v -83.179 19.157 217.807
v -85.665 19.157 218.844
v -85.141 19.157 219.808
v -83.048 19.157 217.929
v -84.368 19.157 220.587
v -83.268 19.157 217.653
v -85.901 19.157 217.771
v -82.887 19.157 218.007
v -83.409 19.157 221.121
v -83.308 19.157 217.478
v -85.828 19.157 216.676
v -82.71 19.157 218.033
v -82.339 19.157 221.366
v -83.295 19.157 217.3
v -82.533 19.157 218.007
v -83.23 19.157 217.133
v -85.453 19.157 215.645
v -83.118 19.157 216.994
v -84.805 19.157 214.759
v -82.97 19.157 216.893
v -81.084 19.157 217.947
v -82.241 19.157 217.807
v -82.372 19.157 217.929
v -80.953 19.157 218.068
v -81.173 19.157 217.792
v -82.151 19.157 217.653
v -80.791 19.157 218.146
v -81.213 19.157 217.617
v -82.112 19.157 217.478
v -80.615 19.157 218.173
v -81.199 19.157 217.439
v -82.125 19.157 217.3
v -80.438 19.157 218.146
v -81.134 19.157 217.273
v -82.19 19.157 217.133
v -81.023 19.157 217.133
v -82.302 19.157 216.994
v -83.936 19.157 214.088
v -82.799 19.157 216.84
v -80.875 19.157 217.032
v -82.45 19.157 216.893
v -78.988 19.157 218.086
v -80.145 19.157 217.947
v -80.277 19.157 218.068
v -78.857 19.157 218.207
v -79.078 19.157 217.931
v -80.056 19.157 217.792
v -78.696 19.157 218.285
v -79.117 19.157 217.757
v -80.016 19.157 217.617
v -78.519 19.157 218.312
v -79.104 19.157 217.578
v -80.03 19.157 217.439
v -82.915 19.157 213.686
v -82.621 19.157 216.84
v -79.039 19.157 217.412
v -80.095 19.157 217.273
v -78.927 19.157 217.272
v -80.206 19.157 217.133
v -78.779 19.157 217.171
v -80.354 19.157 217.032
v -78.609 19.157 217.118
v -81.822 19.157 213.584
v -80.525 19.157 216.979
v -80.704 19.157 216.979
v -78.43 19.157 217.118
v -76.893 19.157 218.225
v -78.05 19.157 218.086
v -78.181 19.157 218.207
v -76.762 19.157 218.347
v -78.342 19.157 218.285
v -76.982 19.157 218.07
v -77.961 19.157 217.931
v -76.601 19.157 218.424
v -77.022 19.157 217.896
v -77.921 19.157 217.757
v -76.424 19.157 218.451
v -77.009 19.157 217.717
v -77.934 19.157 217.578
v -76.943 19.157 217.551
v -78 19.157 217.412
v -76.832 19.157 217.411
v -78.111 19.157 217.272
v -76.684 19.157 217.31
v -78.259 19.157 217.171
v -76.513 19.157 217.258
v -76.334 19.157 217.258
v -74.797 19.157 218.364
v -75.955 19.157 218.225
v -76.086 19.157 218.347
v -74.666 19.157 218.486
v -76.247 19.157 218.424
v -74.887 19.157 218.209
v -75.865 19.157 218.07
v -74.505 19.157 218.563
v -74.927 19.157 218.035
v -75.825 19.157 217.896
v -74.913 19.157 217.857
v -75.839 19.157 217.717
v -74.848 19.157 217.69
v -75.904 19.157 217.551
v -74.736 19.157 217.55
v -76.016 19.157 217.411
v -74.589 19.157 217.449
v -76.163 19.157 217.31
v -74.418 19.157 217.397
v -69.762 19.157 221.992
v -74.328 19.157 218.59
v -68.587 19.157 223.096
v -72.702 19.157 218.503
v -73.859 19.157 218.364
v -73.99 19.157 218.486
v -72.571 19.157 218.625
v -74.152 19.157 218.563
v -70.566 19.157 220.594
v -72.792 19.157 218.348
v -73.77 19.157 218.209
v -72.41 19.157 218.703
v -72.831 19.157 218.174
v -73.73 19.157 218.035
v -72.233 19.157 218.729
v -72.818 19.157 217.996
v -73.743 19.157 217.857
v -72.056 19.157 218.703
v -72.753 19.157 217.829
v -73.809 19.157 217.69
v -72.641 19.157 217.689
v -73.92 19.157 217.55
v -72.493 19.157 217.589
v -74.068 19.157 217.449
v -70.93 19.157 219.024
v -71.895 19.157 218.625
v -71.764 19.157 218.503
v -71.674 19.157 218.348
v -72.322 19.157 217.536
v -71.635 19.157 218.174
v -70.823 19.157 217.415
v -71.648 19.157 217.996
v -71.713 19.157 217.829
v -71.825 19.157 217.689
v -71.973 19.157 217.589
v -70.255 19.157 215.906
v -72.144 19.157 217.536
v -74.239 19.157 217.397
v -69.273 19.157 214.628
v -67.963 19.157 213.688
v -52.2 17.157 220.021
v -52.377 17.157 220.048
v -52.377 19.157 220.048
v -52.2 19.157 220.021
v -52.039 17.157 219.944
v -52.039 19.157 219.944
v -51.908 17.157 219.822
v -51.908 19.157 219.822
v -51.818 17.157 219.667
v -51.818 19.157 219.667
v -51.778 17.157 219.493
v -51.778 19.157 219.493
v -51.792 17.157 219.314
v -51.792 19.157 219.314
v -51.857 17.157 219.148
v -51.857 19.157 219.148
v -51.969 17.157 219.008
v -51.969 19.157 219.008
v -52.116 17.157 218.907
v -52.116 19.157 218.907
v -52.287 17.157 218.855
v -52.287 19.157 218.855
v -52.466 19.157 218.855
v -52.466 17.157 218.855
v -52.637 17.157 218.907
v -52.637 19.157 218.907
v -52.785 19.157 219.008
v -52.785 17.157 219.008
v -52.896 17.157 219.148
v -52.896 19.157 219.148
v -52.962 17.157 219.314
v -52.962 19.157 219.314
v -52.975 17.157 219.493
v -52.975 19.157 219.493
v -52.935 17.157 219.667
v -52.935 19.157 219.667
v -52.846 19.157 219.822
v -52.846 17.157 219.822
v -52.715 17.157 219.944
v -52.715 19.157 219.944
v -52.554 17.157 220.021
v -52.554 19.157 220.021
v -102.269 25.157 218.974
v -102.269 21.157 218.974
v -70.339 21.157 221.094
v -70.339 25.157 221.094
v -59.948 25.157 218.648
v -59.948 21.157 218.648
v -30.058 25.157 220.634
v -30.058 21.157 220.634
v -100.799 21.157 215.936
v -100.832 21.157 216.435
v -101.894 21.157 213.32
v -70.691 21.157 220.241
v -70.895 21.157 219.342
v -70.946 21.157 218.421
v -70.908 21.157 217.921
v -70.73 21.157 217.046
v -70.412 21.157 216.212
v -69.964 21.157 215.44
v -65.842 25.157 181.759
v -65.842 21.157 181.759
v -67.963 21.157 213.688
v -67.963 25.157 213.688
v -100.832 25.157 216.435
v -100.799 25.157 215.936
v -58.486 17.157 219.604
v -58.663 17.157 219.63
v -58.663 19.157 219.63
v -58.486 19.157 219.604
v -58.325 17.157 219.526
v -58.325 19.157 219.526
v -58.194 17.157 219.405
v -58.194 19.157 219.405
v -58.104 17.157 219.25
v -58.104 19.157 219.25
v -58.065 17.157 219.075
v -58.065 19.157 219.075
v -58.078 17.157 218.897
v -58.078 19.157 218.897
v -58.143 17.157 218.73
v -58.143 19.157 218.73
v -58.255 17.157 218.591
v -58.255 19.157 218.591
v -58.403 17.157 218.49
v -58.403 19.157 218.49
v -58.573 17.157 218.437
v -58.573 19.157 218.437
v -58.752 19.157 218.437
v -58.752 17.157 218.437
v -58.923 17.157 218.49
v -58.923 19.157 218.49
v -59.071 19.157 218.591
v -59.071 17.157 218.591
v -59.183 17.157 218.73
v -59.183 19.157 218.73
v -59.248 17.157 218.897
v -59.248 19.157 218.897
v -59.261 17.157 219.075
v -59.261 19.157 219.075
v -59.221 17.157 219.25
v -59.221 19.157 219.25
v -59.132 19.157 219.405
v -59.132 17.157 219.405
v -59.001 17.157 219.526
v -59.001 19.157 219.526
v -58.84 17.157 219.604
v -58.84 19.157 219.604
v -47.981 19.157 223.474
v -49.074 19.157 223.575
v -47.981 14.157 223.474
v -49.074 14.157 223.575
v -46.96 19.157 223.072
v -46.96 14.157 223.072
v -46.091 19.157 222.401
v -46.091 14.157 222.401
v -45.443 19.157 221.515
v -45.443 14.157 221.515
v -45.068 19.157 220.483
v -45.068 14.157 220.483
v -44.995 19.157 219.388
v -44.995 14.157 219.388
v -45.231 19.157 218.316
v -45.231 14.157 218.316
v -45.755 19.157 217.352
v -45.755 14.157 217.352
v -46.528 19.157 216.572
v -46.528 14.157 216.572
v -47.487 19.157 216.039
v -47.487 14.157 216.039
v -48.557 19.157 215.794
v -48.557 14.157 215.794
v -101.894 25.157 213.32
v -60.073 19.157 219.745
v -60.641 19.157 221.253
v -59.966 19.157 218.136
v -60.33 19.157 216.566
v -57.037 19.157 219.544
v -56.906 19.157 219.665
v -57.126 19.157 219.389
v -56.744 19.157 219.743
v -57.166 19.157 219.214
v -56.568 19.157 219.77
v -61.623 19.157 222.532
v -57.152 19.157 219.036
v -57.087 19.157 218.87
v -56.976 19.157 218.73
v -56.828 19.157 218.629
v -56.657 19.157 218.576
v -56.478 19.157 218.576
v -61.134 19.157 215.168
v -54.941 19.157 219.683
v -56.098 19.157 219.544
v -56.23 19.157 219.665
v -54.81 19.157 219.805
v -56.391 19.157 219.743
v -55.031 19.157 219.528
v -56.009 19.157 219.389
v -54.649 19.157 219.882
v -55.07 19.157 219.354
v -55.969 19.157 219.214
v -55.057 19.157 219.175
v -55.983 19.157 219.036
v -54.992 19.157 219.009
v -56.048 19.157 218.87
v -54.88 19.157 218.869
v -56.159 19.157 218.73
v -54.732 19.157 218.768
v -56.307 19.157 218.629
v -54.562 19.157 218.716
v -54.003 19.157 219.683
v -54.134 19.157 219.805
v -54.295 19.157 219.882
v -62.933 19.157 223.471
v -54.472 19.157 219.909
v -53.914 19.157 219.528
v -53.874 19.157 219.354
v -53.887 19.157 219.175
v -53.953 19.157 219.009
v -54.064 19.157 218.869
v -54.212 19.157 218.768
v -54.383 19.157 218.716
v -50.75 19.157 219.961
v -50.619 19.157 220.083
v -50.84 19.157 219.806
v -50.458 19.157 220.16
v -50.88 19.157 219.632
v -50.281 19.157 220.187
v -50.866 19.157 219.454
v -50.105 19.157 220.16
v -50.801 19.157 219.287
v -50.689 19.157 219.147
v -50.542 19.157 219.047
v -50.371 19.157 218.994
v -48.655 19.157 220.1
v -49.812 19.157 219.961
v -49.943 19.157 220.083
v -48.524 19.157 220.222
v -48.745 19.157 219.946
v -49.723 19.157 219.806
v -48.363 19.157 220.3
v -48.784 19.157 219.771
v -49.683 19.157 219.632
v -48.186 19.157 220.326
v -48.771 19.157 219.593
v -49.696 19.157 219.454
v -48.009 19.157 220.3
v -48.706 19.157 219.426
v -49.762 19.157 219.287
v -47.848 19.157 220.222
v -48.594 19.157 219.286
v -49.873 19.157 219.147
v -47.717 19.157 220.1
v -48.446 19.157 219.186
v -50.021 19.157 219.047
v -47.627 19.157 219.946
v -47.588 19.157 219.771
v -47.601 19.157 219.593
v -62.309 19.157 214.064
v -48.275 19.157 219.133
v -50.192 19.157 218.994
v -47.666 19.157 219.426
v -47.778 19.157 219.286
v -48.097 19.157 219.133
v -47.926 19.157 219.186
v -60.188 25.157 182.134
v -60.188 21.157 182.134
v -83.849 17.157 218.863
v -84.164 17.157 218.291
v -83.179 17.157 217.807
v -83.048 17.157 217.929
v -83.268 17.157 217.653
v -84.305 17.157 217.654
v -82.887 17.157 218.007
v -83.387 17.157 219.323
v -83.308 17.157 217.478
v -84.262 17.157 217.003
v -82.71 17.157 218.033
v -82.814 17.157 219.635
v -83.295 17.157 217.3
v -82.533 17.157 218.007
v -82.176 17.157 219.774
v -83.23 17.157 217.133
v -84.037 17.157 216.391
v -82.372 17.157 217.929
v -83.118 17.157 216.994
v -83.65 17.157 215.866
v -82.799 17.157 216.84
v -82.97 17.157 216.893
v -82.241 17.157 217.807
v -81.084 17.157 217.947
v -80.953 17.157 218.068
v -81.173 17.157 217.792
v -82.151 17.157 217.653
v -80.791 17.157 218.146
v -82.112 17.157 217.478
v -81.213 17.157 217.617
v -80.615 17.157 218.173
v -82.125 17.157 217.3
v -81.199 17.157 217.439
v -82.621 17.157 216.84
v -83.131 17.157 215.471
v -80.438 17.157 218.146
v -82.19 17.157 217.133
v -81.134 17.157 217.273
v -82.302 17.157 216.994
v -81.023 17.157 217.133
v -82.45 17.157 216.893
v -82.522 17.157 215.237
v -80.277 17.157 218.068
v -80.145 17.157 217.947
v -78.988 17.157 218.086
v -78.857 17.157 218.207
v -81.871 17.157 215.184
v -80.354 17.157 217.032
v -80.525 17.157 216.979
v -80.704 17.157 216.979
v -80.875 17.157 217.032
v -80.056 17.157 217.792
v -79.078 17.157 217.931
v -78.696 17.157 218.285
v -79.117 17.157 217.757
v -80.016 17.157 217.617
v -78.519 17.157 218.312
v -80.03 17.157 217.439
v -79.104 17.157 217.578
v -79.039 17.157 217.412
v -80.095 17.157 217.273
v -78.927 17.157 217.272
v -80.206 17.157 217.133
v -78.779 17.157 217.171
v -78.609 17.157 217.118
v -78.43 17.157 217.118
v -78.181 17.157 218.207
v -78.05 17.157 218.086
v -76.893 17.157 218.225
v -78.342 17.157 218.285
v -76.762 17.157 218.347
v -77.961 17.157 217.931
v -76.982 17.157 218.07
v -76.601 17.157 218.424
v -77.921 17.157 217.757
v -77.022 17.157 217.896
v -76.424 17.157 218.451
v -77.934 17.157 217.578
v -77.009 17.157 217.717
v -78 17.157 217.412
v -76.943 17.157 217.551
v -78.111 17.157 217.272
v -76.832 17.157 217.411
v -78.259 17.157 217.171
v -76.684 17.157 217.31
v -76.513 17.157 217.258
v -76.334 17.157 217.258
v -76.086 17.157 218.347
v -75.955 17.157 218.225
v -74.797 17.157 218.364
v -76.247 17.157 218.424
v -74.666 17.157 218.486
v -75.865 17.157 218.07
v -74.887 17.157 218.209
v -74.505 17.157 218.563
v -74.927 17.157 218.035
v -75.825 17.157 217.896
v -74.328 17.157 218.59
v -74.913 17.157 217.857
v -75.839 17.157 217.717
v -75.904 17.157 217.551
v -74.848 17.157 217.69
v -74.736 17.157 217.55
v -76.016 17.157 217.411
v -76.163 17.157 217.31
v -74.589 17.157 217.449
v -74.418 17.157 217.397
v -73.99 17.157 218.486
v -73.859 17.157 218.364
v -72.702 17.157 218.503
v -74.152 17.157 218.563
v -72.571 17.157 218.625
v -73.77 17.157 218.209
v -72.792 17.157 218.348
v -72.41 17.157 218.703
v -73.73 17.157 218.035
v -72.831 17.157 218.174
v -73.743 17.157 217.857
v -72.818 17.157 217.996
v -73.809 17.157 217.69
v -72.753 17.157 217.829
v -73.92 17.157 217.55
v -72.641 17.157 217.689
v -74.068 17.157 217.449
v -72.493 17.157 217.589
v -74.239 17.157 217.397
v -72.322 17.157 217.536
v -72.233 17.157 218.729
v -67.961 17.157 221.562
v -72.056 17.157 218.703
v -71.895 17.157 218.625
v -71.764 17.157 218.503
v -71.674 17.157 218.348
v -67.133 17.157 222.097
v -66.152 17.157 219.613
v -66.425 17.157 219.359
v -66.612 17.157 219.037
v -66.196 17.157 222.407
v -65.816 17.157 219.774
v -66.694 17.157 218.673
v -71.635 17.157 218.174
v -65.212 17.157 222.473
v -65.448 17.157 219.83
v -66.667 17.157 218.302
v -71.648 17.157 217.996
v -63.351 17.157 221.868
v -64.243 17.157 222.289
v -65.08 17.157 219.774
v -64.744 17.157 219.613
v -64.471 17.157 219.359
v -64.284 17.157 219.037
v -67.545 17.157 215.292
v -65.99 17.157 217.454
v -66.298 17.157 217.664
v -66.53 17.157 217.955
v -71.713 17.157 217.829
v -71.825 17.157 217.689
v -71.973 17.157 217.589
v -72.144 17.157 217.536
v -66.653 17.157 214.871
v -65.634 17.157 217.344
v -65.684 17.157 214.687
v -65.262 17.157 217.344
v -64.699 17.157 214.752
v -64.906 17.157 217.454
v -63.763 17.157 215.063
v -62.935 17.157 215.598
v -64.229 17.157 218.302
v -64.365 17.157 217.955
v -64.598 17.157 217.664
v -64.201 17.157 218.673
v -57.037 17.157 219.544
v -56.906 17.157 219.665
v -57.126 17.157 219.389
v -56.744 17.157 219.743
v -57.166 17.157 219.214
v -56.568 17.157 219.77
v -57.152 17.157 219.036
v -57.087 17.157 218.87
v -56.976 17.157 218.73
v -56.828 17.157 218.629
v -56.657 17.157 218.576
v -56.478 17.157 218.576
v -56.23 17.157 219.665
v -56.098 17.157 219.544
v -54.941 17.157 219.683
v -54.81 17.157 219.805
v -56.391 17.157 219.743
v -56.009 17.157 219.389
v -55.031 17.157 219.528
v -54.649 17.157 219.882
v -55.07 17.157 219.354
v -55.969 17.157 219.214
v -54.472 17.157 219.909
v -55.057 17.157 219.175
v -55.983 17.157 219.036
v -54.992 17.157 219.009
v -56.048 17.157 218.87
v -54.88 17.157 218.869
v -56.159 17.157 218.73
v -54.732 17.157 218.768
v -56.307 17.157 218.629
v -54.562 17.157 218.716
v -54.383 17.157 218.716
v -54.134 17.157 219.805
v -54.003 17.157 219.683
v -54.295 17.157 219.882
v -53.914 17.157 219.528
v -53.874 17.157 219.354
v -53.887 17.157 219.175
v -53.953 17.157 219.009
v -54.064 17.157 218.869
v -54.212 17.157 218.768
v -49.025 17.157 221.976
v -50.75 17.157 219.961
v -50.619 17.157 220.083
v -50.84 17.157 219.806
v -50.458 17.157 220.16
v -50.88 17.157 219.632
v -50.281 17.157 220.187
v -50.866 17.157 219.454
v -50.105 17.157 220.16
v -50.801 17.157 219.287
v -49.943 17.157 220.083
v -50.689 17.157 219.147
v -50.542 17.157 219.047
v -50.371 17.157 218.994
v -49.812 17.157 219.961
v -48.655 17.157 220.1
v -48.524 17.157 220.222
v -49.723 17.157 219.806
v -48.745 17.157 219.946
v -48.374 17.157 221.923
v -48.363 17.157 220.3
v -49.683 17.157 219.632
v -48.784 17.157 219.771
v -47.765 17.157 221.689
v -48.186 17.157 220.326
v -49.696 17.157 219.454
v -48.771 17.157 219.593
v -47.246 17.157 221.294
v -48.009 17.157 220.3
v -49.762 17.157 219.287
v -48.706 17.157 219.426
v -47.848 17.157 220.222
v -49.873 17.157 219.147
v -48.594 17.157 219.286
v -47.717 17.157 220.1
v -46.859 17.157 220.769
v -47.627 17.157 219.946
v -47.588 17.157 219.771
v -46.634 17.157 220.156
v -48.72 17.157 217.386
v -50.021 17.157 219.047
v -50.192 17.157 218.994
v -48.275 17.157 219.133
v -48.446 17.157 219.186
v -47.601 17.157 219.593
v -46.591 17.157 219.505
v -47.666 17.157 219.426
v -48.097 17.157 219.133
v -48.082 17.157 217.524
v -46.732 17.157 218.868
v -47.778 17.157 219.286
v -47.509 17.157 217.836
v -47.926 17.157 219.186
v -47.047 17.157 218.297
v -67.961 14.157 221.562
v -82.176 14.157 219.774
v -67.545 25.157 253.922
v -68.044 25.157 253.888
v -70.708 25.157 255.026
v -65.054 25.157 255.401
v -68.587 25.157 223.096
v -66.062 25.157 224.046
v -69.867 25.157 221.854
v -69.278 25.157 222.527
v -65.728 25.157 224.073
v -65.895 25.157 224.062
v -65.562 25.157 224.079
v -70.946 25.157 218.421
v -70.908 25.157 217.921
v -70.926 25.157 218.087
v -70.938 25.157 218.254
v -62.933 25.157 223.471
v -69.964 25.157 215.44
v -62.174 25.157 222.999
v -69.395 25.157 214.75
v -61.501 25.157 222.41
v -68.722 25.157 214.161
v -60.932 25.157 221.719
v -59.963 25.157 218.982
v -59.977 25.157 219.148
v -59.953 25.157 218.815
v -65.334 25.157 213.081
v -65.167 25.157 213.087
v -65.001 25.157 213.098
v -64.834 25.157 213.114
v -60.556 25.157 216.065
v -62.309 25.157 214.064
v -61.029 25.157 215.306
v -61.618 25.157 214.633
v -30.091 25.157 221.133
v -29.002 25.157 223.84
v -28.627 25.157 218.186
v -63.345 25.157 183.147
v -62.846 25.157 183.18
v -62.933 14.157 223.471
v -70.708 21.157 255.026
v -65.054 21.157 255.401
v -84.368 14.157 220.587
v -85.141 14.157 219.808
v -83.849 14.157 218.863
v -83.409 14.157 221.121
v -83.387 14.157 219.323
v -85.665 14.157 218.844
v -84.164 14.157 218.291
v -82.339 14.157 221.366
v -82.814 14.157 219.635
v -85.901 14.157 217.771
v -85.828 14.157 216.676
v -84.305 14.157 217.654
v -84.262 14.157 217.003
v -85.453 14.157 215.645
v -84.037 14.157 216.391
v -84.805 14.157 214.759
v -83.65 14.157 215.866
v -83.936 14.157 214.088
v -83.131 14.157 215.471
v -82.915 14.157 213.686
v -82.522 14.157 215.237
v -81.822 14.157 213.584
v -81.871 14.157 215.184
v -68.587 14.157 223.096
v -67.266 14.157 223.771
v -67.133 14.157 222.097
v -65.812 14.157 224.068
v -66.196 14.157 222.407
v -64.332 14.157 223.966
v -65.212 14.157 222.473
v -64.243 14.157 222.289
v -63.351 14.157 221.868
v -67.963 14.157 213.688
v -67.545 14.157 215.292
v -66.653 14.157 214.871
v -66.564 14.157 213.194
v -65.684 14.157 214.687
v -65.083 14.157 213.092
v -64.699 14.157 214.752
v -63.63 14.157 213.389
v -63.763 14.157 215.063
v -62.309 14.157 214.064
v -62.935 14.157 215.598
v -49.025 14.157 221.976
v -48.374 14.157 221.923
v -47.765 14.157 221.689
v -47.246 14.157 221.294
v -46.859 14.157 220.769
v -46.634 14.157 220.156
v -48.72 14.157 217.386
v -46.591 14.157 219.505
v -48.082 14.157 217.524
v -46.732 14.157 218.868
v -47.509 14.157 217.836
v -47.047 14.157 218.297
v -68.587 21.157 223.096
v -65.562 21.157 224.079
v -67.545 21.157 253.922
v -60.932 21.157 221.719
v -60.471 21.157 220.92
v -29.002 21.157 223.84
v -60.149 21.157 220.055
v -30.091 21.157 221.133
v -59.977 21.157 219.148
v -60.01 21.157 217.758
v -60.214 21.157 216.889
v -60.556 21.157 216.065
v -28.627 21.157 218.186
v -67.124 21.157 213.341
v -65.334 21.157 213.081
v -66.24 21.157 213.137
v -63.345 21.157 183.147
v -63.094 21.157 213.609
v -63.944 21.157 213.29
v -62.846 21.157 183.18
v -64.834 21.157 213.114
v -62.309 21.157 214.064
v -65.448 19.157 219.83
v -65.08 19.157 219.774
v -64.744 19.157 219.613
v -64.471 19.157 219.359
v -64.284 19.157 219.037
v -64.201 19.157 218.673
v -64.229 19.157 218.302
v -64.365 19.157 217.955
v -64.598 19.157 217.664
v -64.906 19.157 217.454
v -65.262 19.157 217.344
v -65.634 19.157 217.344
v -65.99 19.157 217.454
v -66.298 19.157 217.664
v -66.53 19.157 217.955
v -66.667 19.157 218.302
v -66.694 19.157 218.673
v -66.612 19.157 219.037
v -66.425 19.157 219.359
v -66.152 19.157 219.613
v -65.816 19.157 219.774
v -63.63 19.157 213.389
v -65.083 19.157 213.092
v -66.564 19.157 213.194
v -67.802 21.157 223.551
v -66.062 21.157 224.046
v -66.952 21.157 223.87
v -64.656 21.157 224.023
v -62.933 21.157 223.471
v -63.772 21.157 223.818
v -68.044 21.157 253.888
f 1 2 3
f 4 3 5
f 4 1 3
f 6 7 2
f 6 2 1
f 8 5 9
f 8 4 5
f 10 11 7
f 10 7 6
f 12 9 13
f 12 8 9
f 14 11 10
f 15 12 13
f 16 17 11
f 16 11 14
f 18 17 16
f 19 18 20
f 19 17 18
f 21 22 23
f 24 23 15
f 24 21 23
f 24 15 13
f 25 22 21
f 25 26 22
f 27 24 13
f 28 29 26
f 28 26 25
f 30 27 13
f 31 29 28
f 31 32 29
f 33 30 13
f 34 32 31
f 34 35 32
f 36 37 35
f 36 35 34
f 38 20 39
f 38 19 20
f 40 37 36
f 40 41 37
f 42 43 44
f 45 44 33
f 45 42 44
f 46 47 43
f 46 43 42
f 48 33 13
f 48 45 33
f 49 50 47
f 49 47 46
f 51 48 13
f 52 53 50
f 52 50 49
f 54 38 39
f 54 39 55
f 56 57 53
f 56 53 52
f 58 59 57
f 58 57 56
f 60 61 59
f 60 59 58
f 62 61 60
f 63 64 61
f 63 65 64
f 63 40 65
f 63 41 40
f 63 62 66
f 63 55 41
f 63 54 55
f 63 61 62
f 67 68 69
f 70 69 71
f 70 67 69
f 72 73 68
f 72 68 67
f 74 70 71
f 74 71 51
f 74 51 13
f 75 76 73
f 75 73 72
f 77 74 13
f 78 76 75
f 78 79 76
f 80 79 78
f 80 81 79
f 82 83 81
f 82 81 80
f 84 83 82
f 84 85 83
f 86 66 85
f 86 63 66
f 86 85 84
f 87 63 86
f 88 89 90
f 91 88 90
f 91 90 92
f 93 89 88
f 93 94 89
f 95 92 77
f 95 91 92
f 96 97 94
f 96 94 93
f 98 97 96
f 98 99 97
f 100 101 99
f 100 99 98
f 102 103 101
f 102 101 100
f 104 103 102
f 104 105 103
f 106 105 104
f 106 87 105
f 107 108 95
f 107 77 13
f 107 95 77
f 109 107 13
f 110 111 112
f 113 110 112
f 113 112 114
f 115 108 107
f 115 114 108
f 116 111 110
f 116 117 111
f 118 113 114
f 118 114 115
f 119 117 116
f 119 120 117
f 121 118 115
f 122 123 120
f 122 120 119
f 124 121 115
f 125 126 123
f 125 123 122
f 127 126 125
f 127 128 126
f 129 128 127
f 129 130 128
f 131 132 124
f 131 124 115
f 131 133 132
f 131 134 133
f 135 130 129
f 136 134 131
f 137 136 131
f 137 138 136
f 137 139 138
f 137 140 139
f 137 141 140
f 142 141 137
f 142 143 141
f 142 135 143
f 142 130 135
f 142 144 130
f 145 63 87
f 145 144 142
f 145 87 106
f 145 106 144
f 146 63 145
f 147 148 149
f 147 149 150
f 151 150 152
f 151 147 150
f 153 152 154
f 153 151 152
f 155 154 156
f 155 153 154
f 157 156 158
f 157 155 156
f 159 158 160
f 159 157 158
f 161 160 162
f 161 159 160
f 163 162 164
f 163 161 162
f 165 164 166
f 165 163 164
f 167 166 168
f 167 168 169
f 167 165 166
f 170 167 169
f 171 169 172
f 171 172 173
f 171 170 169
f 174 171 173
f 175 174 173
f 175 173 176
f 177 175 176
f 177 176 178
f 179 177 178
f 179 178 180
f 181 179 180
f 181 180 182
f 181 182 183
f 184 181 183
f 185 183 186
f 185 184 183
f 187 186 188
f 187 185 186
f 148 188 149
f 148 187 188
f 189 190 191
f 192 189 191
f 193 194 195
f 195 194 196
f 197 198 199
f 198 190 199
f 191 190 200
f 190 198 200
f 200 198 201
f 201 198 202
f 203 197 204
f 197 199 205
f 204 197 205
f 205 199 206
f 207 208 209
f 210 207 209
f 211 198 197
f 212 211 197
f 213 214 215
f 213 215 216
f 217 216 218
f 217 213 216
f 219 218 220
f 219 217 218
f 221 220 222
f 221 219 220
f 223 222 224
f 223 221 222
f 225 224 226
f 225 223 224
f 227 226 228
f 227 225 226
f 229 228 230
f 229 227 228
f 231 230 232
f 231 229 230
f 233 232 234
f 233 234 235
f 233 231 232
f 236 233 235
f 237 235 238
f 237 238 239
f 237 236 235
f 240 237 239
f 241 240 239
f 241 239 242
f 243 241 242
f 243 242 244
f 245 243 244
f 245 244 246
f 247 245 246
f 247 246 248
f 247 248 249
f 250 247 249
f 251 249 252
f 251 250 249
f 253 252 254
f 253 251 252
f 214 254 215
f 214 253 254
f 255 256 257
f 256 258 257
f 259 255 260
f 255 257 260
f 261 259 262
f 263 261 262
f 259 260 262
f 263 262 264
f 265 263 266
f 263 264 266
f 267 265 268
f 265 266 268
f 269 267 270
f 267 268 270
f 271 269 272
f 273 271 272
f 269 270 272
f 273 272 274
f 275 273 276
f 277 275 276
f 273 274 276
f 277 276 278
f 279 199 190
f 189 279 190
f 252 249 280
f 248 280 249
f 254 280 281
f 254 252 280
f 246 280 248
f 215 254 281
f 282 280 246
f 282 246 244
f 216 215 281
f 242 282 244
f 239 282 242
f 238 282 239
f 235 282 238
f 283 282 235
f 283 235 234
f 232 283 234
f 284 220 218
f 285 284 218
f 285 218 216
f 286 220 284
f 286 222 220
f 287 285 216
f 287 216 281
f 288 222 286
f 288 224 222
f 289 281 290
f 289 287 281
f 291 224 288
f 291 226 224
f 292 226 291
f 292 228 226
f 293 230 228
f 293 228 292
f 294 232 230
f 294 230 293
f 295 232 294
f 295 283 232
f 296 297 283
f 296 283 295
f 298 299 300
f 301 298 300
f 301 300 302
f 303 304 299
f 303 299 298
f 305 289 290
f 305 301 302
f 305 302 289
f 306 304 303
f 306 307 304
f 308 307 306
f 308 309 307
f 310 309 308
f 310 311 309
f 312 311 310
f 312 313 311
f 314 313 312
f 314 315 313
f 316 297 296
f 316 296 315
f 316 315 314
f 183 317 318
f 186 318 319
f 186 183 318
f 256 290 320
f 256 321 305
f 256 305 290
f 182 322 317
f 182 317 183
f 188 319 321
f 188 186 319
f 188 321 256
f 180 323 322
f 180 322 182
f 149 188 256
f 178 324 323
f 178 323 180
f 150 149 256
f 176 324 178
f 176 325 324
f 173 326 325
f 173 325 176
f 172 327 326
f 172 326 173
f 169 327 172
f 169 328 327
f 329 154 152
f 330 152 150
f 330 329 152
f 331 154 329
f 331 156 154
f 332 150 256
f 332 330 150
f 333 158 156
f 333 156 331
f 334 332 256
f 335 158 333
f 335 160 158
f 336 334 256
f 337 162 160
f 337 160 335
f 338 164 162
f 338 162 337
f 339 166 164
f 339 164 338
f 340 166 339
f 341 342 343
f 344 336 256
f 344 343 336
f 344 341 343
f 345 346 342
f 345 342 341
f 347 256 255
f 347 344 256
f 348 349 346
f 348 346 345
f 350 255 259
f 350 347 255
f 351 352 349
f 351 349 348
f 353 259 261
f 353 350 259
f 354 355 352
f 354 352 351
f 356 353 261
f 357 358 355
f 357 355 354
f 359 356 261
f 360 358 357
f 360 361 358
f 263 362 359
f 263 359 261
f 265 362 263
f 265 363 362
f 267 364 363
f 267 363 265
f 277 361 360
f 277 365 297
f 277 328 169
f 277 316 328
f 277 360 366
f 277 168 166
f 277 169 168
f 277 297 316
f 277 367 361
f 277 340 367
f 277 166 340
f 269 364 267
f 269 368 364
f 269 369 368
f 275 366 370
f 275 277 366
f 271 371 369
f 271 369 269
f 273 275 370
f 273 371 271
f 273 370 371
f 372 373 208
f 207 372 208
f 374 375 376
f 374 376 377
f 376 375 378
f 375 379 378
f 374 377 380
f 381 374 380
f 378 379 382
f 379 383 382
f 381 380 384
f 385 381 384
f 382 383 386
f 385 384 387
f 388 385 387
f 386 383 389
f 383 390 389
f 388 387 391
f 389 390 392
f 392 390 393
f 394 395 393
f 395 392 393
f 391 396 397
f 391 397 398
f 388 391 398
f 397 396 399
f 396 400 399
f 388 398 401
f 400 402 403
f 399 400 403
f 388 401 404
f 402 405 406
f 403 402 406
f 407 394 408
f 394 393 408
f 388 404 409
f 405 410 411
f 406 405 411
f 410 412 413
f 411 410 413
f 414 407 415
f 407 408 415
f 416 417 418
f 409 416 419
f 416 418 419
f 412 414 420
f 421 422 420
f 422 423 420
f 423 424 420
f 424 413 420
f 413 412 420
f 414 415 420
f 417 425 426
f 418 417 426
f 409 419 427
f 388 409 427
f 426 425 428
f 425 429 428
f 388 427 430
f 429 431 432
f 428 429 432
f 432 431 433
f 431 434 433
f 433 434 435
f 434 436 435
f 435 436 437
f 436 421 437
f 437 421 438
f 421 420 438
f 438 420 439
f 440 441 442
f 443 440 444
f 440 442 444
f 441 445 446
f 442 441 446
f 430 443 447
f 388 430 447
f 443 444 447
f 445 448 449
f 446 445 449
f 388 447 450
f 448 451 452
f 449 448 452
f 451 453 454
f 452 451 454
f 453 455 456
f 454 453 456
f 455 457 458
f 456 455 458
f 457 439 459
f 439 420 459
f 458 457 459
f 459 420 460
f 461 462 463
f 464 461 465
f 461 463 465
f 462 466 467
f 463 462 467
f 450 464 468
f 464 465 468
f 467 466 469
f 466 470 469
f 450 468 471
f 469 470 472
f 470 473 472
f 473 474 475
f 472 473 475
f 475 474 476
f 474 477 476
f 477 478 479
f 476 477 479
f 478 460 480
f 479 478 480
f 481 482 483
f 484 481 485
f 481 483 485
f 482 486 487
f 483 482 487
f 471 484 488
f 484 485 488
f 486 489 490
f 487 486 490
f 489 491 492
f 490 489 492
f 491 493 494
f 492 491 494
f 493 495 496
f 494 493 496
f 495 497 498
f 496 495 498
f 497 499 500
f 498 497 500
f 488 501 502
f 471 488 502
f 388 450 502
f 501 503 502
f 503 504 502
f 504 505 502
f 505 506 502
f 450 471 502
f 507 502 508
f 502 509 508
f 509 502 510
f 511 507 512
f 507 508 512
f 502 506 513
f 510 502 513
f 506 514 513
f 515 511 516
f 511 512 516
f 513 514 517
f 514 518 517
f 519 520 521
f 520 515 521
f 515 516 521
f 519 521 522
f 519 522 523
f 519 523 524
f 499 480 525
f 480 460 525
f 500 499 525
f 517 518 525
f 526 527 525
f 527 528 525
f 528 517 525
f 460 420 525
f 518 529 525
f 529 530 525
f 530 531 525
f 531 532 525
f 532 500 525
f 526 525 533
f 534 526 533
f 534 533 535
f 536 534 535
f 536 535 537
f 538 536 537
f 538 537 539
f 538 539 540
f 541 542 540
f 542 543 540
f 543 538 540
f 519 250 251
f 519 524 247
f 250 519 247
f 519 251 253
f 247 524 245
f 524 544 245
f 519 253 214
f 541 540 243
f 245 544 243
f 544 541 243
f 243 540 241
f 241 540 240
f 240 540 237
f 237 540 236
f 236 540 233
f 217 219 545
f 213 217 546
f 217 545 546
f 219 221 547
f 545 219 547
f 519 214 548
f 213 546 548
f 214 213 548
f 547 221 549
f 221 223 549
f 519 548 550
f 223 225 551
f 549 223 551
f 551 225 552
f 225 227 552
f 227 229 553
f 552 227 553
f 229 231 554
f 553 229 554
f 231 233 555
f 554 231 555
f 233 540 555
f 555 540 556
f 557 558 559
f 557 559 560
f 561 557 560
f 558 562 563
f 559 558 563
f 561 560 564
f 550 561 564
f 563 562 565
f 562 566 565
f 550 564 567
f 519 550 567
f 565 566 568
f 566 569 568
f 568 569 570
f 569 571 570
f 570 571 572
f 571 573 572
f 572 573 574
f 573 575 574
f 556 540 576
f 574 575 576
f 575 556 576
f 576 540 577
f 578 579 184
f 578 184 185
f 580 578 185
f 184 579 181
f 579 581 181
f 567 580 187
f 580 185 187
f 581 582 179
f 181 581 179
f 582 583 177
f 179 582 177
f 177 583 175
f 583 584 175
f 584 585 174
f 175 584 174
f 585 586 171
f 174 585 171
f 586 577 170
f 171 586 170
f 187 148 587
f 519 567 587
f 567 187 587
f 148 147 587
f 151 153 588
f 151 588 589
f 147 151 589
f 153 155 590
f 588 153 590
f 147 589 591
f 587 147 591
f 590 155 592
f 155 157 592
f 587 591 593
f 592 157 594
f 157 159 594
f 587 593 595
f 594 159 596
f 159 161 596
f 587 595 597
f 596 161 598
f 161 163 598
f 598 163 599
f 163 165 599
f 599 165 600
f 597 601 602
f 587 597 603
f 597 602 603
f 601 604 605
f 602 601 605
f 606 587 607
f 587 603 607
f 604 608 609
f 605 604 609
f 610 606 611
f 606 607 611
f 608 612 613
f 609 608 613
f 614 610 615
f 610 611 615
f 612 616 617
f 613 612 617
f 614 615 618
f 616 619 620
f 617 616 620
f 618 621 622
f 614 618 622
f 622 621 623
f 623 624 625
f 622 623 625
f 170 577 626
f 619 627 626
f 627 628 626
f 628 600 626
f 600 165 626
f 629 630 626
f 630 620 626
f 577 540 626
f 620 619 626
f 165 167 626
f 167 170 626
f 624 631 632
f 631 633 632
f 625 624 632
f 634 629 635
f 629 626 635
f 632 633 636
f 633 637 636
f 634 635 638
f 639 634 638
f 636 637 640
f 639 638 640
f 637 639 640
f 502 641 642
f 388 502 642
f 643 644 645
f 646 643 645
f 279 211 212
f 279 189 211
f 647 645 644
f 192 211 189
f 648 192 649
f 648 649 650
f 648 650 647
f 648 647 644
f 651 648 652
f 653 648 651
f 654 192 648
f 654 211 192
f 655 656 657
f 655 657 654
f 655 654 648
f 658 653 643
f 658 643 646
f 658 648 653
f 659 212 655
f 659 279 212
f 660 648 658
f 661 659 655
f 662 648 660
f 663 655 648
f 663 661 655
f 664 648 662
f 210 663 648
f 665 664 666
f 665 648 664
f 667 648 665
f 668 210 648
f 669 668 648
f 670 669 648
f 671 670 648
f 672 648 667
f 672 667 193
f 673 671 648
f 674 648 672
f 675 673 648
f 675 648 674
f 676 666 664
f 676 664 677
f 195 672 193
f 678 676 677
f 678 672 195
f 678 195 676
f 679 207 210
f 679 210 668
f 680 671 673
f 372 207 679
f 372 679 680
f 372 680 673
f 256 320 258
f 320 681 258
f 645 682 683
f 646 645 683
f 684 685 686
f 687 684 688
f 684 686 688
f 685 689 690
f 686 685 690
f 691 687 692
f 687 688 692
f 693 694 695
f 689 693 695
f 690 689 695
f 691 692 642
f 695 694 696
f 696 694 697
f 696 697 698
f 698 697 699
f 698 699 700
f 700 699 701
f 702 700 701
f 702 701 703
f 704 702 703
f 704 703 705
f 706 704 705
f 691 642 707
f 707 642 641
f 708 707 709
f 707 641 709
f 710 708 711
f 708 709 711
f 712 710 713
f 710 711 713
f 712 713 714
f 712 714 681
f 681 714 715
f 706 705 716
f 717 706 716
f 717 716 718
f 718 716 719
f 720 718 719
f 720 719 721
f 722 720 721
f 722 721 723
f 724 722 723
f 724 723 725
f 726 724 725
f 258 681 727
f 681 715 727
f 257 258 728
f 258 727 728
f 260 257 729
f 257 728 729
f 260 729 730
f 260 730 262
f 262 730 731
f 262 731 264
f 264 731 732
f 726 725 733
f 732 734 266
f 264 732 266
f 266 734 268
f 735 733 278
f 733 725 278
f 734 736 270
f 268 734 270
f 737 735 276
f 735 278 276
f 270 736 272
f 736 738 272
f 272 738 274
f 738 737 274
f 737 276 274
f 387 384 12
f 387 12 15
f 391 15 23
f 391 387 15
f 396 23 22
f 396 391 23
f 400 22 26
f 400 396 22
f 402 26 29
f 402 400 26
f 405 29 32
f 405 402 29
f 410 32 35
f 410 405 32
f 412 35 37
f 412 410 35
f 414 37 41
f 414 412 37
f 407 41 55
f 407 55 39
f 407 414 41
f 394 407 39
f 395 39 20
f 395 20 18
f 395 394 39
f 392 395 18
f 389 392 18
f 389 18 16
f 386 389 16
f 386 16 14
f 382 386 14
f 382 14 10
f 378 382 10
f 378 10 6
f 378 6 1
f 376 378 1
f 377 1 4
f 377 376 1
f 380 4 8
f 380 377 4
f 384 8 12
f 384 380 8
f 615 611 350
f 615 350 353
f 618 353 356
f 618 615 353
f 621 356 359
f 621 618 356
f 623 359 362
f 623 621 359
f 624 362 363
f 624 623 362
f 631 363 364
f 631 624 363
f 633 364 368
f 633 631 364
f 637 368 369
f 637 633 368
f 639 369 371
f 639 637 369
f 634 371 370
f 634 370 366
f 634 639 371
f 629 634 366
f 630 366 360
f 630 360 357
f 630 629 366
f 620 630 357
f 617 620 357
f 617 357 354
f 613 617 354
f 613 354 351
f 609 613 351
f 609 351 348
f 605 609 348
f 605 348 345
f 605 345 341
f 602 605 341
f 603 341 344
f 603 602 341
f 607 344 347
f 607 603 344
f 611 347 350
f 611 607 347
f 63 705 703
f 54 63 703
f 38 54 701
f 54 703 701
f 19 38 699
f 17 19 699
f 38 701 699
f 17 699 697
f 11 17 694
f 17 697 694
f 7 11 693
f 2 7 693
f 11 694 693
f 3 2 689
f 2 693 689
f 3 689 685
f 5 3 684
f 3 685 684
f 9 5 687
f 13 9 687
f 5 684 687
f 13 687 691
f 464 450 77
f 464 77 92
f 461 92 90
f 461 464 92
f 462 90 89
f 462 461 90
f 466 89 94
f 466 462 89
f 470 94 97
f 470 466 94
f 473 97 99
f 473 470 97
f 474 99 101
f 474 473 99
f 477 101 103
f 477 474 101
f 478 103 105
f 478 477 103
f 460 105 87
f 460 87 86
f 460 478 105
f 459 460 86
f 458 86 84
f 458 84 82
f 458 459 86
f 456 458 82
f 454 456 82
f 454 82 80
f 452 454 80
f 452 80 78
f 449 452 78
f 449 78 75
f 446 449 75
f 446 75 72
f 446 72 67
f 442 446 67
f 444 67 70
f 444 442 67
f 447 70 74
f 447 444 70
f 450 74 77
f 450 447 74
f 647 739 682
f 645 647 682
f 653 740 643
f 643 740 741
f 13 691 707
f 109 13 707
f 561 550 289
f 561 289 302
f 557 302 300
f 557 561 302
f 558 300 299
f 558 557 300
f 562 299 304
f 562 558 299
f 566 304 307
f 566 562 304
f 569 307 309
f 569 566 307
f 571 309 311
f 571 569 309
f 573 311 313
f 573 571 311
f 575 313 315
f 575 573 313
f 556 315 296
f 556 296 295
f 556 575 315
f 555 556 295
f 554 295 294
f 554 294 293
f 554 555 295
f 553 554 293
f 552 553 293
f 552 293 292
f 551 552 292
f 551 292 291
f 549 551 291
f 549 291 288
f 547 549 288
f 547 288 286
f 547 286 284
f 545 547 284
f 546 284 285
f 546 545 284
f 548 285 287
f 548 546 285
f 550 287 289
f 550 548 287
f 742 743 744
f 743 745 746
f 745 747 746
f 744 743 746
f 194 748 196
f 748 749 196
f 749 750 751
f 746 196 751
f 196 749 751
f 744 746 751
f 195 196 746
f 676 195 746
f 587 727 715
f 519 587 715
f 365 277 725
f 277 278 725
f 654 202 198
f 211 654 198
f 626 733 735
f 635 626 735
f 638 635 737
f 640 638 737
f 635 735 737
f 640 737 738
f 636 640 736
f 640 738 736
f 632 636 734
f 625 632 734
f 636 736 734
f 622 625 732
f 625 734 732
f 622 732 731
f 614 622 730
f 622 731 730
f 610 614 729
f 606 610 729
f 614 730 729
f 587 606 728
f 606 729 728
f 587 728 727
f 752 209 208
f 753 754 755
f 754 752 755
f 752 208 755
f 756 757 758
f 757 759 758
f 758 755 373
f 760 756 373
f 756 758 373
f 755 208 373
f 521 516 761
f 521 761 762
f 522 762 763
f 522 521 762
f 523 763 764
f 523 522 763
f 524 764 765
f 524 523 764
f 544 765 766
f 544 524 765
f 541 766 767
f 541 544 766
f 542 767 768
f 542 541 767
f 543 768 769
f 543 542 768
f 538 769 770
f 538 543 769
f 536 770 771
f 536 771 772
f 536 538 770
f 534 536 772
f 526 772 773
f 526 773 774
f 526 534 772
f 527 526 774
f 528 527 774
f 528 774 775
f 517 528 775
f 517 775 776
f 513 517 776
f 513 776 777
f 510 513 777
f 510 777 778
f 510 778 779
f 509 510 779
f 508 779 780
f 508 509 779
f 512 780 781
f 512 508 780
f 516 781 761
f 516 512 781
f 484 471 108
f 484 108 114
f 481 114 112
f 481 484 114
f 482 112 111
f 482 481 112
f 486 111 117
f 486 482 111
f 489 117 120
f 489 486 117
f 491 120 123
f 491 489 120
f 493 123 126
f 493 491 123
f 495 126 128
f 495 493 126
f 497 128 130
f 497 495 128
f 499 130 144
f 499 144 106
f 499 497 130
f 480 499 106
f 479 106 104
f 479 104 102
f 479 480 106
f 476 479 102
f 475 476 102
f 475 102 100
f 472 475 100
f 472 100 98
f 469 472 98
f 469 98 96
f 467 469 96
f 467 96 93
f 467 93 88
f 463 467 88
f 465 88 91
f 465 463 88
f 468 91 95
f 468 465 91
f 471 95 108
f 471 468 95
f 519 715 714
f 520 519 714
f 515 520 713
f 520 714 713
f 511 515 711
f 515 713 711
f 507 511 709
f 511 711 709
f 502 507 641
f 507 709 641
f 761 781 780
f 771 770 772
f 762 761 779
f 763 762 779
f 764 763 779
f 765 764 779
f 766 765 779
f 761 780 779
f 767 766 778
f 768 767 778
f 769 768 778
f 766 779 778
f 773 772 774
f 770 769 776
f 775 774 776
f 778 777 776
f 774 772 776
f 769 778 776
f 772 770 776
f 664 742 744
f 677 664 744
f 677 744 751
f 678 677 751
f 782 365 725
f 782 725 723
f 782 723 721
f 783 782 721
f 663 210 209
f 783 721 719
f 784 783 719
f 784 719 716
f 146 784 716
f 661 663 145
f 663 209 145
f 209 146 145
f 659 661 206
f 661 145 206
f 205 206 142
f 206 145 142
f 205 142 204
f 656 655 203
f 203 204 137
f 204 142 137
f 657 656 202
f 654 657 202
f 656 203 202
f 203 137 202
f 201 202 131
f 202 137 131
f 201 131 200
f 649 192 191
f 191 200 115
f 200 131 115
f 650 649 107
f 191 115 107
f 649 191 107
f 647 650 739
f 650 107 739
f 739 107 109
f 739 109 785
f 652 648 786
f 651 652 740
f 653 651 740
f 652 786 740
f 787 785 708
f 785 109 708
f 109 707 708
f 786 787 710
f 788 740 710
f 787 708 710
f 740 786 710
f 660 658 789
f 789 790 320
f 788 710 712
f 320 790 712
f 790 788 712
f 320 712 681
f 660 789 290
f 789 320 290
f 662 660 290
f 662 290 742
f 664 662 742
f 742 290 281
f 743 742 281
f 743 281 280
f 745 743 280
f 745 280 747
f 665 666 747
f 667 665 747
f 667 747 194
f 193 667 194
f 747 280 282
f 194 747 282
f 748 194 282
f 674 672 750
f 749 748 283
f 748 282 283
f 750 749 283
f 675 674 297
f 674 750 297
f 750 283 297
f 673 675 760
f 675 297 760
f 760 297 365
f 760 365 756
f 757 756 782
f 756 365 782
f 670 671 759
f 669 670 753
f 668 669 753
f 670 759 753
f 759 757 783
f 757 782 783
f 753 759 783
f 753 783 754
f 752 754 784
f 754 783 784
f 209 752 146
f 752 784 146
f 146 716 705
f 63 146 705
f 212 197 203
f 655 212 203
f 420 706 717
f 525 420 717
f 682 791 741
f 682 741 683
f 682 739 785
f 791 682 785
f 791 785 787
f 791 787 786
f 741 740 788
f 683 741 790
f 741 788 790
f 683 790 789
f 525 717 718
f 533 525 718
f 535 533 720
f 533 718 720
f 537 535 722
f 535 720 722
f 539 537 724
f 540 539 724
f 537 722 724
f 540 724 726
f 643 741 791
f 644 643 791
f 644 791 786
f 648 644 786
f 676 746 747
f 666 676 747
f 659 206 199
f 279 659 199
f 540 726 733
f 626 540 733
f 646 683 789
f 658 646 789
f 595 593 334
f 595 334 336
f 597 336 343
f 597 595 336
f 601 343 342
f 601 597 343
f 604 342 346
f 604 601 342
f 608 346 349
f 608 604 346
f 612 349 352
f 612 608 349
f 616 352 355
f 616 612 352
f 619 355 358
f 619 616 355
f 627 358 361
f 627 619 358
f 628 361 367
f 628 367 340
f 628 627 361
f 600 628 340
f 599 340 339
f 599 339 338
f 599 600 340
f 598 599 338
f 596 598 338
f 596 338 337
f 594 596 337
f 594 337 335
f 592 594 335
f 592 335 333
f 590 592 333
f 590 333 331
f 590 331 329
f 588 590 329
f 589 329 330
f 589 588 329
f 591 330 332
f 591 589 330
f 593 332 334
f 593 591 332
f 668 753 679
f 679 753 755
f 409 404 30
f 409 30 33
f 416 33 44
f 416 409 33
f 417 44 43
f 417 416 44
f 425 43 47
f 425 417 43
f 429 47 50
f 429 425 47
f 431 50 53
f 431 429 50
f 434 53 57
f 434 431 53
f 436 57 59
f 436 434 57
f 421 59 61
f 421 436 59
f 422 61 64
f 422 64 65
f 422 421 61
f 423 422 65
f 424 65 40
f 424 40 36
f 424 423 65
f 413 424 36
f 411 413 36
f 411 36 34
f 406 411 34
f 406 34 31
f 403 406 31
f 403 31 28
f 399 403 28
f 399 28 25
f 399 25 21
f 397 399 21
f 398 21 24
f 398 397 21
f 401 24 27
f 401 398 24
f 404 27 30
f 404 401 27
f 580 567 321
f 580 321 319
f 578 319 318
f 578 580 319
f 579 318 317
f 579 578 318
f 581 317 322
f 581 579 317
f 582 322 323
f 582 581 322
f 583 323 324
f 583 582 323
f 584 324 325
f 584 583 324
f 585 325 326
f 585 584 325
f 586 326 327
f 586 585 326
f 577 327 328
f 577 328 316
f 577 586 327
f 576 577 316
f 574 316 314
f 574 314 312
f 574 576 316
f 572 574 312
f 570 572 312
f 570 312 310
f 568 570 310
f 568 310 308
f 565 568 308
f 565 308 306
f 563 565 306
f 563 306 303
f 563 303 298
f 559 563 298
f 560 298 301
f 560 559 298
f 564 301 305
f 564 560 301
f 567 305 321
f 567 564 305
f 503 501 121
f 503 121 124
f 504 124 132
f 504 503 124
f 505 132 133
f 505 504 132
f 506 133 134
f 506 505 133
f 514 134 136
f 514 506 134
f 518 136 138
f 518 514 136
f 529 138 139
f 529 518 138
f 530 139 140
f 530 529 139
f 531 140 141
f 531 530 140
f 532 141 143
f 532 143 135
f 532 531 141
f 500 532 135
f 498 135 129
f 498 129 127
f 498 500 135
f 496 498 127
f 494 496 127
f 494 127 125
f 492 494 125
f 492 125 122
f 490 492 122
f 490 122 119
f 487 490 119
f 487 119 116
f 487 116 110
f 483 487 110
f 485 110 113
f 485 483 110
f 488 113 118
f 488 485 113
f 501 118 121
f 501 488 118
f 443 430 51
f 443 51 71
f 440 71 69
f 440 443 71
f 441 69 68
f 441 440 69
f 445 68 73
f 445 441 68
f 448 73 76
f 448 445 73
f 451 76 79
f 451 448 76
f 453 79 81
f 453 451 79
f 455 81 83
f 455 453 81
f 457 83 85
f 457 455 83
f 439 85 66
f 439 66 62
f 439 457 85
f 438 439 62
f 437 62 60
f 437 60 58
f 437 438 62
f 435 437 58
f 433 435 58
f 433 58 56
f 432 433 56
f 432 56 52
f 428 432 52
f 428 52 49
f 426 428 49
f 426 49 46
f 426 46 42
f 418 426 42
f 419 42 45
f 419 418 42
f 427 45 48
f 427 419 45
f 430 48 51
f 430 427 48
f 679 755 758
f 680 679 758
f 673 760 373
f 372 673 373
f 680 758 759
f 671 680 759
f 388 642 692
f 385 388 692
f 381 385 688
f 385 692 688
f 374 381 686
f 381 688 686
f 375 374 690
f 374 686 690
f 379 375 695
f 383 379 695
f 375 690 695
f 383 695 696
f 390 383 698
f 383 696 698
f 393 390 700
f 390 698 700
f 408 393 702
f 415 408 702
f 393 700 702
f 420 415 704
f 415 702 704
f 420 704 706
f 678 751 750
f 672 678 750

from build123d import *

# Parameters (mm, degrees)
EXTRUDE_1_DEPTH = 3
SKETCH_2_R      = 0.6
SKETCH_2_R_2    = 1.25
EXTRUDE_2_DEPTH = 2
SKETCH_3_R      = 5.5
EXTRUDE_3_DEPTH = 2
SKETCH_4_R      = 5.5
EXTRUDE_5_DEPTH = 4


# Read off the part's stored shape, not the designer's step: 填料-伸長1
with BuildPart() as part:
    # 填料-伸長1 outline → 填料-伸長1 (new body)
    with BuildSketch(Plane(origin=(0, 14.156954032, 0), x_dir=(1, 0, 0), z_dir=(0, 1, 0))):
        with BuildLine():
            Line((-82.339013046, -221.365982672), (-68.587342058, -223.095847576))
            ThreePointArc((-68.587342058, -223.095847576), (-65.812443105, -224.067756352), (-62.933383432, -223.471361963))
            Line((-62.933383432, -223.471361963), (-49.073726982, -223.575336213))
            ThreePointArc((-49.073726982, -223.575336213), (-44.993021918, -219.938385769), (-48.556901099, -215.793711169))
            Line((-48.556901099, -215.793711169), (-62.308572088, -214.063846266))
            ThreePointArc((-62.308572088, -214.063846266), (-65.08347104, -213.091937489), (-67.962530713, -213.688331878))
            Line((-67.962530713, -213.688331878), (-81.822187163, -213.584357628))
            ThreePointArc((-81.822187163, -213.584357628), (-85.902892228, -217.221308072), (-82.339013046, -221.365982672))
        make_face()
        with BuildLine():
            Line((-49.024567087, -221.975659985), (-63.351091856, -221.868183318))
            ThreePointArc((-63.351091856, -221.868183318), (-65.706410804, -222.471273609), (-67.96128377, -221.561991939))
            Line((-67.96128377, -221.561991939), (-82.176185543, -219.773855813))
            ThreePointArc((-82.176185543, -219.773855813), (-84.306409484, -217.327340372), (-81.871347058, -215.184033856))
            Line((-81.871347058, -215.184033856), (-67.544822289, -215.291510523))
            ThreePointArc((-67.544822289, -215.291510523), (-65.189503341, -214.688420233), (-62.934630375, -215.597701902))
            Line((-62.934630375, -215.597701902), (-48.719728602, -217.385838028))
            ThreePointArc((-48.719728602, -217.385838028), (-46.589504661, -219.832353469), (-49.024567087, -221.975659985))
        make_face(mode=Mode.SUBTRACT)
    extrude(amount=EXTRUDE_1_DEPTH)

    # 草圖2 → 填料-伸長2 (add)
    with BuildSketch(Plane(origin=(0, 17.156954032, 0), x_dir=(1, 0, 0), z_dir=(0, 1, 0))):
        with BuildLine():
            Line((-82.339013046, -221.365982672), (-68.587342058, -223.095847576))
            ThreePointArc((-68.587342058, -223.095847576), (-65.812443105, -224.067756352), (-62.933383432, -223.471361963))
            Line((-62.933383432, -223.471361963), (-49.073726982, -223.575336213))
            ThreePointArc((-49.073726982, -223.575336213), (-44.993021918, -219.938385769), (-48.556901099, -215.793711169))
            Line((-48.556901099, -215.793711169), (-62.308572088, -214.063846266))
            ThreePointArc((-62.308572088, -214.063846266), (-65.08347104, -213.091937489), (-67.962530713, -213.688331878))
            Line((-67.962530713, -213.688331878), (-81.822187163, -213.584357628))
            ThreePointArc((-81.822187163, -213.584357628), (-85.902892228, -217.221308072), (-82.339013046, -221.365982672))
        make_face()
        with Locations(Location((-48.185987405, -219.726321168, 0), (0, 0, 270))):
            Circle(SKETCH_2_R, mode=Mode.SUBTRACT)
        with Locations(Location((-50.281371006, -219.587153774, 0), (0, 0, 270))):
            Circle(SKETCH_2_R, mode=Mode.SUBTRACT)
        with Locations(Location((-52.376754608, -219.44798638, 0), (0, 0, 270))):
            Circle(SKETCH_2_R, mode=Mode.SUBTRACT)
        with Locations(Location((-54.472138209, -219.308818985, 0), (0, 0, 270))):
            Circle(SKETCH_2_R, mode=Mode.SUBTRACT)
        with Locations(Location((-56.56752181, -219.169651591, 0), (0, 0, 270))):
            Circle(SKETCH_2_R, mode=Mode.SUBTRACT)
        with Locations(Location((-58.662905411, -219.030484197, 0), (0, 0, 270))):
            Circle(SKETCH_2_R, mode=Mode.SUBTRACT)
        with Locations(Location((-65.447957073, -218.579846921, 0), (0, 0, 270))):
            Circle(SKETCH_2_R_2, mode=Mode.SUBTRACT)
        with Locations(Location((-72.233008734, -218.129209644, 0), (0, 0, 270))):
            Circle(SKETCH_2_R, mode=Mode.SUBTRACT)
        with Locations(Location((-74.328392335, -217.99004225, 0), (0, 0, 270))):
            Circle(SKETCH_2_R, mode=Mode.SUBTRACT)
        with Locations(Location((-76.423775936, -217.850874856, 0), (0, 0, 270))):
            Circle(SKETCH_2_R, mode=Mode.SUBTRACT)
        with Locations(Location((-78.519159538, -217.711707461, 0), (0, 0, 270))):
            Circle(SKETCH_2_R, mode=Mode.SUBTRACT)
        with Locations(Location((-80.614543139, -217.572540067, 0), (0, 0, 270))):
            Circle(SKETCH_2_R, mode=Mode.SUBTRACT)
        with Locations(Location((-82.70992674, -217.433372673, 0), (0, 0, 270))):
            Circle(SKETCH_2_R, mode=Mode.SUBTRACT)
    extrude(amount=EXTRUDE_2_DEPTH)

    # 草圖3 → 填料-伸長3 (add)
    with BuildSketch(Plane(origin=(0, 19.156954032, 0), x_dir=(1, 0, 0), z_dir=(0, 1, 0))):
        with Locations(Location((-65.447957073, -218.579846921, 0), (0, 0, 117.206266925))):
            Circle(SKETCH_3_R)
    extrude(amount=EXTRUDE_3_DEPTH)

    # 草圖4 → 填料-伸長5 (add)
    with BuildSketch(Plane(origin=(0, 21.156954032, 0), x_dir=(1, 0, 0), z_dir=(0, 1, 0))):
        with BuildLine():
            Line((-65.841884706, -181.758677002), (-67.962530713, -213.688331878))
            ThreePointArc((-67.962530713, -213.688331878), (-66.686272082, -213.221061989), (-65.334397341, -213.081019392))
            Line((-65.334397341, -213.081019392), (-63.345192567, -183.146990755))
            Line((-63.345192567, -183.146990755), (-62.84629171, -183.180125849))
            Line((-62.84629171, -183.180125849), (-64.834397341, -213.114177295))
            ThreePointArc((-64.834397341, -213.114177295), (-63.512339264, -213.431703207), (-62.308572088, -214.063846266))
            Line((-62.308572088, -214.063846266), (-60.187926081, -182.134191389))
            Line((-60.187926081, -182.134191389), (-65.841884706, -181.758677002))
        make_face()
        with BuildLine():
            Line((-28.626787154, -218.185919287), (-60.55644203, -216.06527328))
            ThreePointArc((-60.55644203, -216.06527328), (-60.102242306, -217.286272944), (-59.947957073, -218.579846921))
            ThreePointArc((-59.947957073, -218.579846921), (-59.94806161, -218.613757162), (-59.94837522, -218.647666115))
            Line((-59.94837522, -218.647666115), (-30.05766404, -220.633992316))
            Line((-30.05766404, -220.633992316), (-30.090799133, -221.132893173))
            Line((-30.090799133, -221.132893173), (-59.977374886, -219.147940697))
            ThreePointArc((-59.977374886, -219.147940697), (-60.291810853, -220.494045491), (-60.931956418, -221.719231906))
            Line((-60.931956418, -221.719231906), (-29.002301541, -223.839877913))
            Line((-29.002301541, -223.839877913), (-28.626787154, -218.185919287))
        make_face()
        with Locations(Location((-65.447957073, -218.579846921, 0), (0, 0, 117.206266925))):
            Circle(SKETCH_4_R)
        with BuildLine():
            ThreePointArc((-66.061516804, -224.045516546), (-67.383574881, -223.727990635), (-68.587342058, -223.095847576))
            Line((-68.587342058, -223.095847576), (-70.707988065, -255.025502452))
            Line((-70.707988065, -255.025502452), (-65.054029439, -255.401016839))
            Line((-65.054029439, -255.401016839), (-62.933383432, -223.471361963))
            ThreePointArc((-62.933383432, -223.471361963), (-64.209643695, -223.938632229), (-65.561520152, -224.07867438))
            Line((-65.561520152, -224.07867438), (-67.544665601, -253.921520844))
            Line((-67.544665601, -253.921520844), (-68.043566458, -253.88838575))
            Line((-68.043566458, -253.88838575), (-66.061516804, -224.045516546))
        make_face()
        with BuildLine():
            ThreePointArc((-70.908334203, -217.920846468), (-70.588006225, -216.622835241), (-69.963957728, -215.440461936))
            Line((-69.963957728, -215.440461936), (-101.893612604, -213.319815929))
            Line((-101.893612604, -213.319815929), (-102.269126991, -218.973774554))
            Line((-102.269126991, -218.973774554), (-70.339472115, -221.094420561))
            ThreePointArc((-70.339472115, -221.094420561), (-70.811844008, -219.795871979), (-70.945650262, -218.420568553))
            Line((-70.945650262, -218.420568553), (-100.832194129, -216.434519282))
            Line((-100.832194129, -216.434519282), (-100.799059035, -215.935618425))
            Line((-100.799059035, -215.935618425), (-70.908334203, -217.920846468))
        make_face()
    extrude(amount=EXTRUDE_5_DEPTH)


solid = part.part
